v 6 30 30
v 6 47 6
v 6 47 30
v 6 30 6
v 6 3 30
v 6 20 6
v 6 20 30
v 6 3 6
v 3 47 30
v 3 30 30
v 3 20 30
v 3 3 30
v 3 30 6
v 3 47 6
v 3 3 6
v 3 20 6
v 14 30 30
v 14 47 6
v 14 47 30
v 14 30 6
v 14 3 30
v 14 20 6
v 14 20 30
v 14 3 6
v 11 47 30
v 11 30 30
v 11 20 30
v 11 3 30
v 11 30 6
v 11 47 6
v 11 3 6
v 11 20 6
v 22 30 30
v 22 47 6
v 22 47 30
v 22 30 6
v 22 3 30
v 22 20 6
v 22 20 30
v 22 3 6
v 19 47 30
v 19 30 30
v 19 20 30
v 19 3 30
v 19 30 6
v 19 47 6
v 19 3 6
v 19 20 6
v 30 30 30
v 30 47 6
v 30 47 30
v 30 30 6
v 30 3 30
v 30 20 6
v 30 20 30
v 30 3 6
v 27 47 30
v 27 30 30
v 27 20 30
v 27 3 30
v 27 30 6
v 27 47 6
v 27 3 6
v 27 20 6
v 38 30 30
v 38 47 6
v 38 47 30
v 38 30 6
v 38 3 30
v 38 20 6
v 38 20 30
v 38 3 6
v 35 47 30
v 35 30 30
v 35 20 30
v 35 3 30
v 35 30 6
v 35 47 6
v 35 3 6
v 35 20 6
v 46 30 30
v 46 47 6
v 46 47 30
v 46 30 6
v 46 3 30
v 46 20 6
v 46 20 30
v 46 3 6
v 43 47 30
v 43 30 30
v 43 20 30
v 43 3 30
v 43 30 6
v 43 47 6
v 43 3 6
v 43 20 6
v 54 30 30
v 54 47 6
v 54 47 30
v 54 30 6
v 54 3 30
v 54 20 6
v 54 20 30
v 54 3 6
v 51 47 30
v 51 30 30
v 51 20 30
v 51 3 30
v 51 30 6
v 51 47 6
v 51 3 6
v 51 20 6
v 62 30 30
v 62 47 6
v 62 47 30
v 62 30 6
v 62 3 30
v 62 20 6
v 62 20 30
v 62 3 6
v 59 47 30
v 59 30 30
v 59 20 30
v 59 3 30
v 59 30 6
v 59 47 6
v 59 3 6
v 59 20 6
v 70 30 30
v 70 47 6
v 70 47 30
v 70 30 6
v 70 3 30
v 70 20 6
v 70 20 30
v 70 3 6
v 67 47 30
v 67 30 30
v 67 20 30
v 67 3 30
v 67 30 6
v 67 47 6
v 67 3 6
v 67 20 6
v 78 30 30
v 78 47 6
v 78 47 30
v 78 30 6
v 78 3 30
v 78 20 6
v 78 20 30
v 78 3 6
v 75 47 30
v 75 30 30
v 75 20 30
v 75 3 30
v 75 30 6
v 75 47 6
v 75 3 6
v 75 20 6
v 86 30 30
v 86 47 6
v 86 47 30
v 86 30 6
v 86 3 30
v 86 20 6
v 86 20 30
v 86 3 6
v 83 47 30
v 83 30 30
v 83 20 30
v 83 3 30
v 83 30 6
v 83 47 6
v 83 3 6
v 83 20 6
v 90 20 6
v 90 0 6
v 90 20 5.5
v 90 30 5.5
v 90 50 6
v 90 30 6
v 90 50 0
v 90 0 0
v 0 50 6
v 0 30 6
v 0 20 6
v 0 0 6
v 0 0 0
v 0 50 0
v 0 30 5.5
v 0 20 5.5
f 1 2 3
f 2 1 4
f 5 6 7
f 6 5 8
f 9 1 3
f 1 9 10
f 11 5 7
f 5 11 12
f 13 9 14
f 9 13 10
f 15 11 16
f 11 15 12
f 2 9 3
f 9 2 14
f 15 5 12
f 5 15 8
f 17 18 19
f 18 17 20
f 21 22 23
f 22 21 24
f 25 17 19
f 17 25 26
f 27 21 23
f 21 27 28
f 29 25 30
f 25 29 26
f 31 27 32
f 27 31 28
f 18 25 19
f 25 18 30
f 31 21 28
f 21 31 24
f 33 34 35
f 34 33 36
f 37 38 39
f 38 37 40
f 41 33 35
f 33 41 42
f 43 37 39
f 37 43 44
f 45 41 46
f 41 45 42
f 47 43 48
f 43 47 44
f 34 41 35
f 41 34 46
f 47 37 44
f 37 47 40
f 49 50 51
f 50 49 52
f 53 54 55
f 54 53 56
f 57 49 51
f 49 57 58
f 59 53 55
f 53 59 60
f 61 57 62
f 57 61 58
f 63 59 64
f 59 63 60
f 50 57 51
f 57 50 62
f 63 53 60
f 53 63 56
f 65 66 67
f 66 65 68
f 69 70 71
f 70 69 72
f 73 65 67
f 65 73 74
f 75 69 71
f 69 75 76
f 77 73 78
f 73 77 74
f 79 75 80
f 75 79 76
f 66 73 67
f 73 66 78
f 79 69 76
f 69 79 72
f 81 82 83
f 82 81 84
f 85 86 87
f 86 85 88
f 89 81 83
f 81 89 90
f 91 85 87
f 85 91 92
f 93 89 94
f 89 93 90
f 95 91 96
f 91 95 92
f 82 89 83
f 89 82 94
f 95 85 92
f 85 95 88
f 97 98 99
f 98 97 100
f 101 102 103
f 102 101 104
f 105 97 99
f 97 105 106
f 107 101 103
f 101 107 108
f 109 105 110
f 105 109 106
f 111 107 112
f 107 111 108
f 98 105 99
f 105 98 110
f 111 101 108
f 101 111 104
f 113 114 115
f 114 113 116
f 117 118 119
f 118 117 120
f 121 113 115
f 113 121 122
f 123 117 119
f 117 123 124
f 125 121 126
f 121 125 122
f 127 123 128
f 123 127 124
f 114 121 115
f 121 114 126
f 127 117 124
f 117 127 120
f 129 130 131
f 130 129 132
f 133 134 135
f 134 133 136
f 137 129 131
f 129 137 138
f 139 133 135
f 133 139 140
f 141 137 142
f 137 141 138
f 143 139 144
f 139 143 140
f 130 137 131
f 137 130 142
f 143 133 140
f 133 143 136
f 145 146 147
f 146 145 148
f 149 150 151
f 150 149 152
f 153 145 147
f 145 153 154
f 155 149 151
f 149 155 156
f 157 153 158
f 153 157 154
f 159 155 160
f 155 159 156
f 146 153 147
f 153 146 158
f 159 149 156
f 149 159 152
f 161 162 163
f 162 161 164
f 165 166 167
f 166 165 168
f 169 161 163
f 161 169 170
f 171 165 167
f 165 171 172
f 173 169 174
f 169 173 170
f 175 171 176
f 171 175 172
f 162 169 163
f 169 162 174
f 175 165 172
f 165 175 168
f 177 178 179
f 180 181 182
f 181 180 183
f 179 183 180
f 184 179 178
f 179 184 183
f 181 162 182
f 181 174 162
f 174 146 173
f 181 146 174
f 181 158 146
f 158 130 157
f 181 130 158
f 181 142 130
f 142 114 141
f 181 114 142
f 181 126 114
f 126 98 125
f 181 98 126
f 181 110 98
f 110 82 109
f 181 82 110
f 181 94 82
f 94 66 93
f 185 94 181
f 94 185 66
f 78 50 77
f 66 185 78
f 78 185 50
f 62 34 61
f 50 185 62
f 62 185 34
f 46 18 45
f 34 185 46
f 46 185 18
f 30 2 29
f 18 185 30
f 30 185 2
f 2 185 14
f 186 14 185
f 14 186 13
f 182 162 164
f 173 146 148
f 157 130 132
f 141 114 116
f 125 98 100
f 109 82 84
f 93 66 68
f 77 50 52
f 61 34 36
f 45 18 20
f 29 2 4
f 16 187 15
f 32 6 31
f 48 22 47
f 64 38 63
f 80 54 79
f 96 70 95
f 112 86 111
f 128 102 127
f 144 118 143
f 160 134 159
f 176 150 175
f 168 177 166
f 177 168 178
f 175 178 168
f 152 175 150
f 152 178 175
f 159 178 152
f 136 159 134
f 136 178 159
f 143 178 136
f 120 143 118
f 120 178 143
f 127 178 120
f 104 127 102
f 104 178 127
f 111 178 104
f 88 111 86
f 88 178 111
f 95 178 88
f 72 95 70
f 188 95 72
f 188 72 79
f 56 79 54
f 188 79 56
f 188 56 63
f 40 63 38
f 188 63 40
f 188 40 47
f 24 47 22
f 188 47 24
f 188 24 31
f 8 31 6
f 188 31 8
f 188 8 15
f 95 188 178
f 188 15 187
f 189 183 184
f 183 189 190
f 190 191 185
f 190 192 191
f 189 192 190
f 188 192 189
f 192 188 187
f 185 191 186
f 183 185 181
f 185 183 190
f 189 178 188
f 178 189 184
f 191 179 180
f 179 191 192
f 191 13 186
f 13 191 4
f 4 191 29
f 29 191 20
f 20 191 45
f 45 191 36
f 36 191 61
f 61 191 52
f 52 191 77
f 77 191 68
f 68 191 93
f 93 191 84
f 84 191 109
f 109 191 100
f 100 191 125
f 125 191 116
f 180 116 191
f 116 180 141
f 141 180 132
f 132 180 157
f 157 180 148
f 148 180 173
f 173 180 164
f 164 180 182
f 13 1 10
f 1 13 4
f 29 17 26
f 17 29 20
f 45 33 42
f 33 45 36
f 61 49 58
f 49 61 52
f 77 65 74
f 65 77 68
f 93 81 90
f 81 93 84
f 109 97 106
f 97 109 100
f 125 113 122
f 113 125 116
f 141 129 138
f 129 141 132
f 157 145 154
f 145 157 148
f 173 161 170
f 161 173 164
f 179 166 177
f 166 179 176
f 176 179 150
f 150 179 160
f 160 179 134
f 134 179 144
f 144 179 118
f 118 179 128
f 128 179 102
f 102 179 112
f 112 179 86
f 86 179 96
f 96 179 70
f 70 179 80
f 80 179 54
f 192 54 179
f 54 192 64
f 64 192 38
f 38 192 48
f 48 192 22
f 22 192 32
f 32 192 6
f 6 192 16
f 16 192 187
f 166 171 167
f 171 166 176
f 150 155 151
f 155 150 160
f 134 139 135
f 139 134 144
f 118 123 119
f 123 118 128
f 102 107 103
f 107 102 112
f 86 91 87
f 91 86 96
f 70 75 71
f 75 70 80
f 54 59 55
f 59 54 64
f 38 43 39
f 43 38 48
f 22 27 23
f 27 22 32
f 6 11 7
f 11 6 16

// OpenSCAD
$fn = 32;

// ----------------------------------------------------------------------
// Heatsink: slotted fin block
// ----------------------------------------------------------------------

// --- parameters (mm) ---
base_l = 90;              // base length, X
base_w = 50;              // base width, Y
base_t = 6;               // base plate thickness
fin_h = 25;               // fin height above the base
fin_t = 3;                // fin thickness
edge = 3;                 // margin from the base ends
pitch = 8;                // fin pitch
slot_w = 10;              // central slot width, Y
fit_tol = 0.02;           // tolerance for press fits, mm
free_tol = 0.2;           // tolerance for clearance fits, mm

n_fins = floor((base_l - 2 * edge - fin_t) / pitch) + 1;  // fin count
total_h = base_t + fin_h - 1;  // overall height

difference() {
union() {
  cube([base_l, base_w, base_t]);
  for (i = [0 : n_fins - 1])
    translate([edge + i * pitch, edge, base_t - 1])
      cube([fin_t, base_w - 2 * edge, fin_h]);
}
  translate([-1, base_w / 2 - slot_w / 2, base_t - 0.5])
    cube([base_l + 2, slot_w, fin_h + 2]);
}
